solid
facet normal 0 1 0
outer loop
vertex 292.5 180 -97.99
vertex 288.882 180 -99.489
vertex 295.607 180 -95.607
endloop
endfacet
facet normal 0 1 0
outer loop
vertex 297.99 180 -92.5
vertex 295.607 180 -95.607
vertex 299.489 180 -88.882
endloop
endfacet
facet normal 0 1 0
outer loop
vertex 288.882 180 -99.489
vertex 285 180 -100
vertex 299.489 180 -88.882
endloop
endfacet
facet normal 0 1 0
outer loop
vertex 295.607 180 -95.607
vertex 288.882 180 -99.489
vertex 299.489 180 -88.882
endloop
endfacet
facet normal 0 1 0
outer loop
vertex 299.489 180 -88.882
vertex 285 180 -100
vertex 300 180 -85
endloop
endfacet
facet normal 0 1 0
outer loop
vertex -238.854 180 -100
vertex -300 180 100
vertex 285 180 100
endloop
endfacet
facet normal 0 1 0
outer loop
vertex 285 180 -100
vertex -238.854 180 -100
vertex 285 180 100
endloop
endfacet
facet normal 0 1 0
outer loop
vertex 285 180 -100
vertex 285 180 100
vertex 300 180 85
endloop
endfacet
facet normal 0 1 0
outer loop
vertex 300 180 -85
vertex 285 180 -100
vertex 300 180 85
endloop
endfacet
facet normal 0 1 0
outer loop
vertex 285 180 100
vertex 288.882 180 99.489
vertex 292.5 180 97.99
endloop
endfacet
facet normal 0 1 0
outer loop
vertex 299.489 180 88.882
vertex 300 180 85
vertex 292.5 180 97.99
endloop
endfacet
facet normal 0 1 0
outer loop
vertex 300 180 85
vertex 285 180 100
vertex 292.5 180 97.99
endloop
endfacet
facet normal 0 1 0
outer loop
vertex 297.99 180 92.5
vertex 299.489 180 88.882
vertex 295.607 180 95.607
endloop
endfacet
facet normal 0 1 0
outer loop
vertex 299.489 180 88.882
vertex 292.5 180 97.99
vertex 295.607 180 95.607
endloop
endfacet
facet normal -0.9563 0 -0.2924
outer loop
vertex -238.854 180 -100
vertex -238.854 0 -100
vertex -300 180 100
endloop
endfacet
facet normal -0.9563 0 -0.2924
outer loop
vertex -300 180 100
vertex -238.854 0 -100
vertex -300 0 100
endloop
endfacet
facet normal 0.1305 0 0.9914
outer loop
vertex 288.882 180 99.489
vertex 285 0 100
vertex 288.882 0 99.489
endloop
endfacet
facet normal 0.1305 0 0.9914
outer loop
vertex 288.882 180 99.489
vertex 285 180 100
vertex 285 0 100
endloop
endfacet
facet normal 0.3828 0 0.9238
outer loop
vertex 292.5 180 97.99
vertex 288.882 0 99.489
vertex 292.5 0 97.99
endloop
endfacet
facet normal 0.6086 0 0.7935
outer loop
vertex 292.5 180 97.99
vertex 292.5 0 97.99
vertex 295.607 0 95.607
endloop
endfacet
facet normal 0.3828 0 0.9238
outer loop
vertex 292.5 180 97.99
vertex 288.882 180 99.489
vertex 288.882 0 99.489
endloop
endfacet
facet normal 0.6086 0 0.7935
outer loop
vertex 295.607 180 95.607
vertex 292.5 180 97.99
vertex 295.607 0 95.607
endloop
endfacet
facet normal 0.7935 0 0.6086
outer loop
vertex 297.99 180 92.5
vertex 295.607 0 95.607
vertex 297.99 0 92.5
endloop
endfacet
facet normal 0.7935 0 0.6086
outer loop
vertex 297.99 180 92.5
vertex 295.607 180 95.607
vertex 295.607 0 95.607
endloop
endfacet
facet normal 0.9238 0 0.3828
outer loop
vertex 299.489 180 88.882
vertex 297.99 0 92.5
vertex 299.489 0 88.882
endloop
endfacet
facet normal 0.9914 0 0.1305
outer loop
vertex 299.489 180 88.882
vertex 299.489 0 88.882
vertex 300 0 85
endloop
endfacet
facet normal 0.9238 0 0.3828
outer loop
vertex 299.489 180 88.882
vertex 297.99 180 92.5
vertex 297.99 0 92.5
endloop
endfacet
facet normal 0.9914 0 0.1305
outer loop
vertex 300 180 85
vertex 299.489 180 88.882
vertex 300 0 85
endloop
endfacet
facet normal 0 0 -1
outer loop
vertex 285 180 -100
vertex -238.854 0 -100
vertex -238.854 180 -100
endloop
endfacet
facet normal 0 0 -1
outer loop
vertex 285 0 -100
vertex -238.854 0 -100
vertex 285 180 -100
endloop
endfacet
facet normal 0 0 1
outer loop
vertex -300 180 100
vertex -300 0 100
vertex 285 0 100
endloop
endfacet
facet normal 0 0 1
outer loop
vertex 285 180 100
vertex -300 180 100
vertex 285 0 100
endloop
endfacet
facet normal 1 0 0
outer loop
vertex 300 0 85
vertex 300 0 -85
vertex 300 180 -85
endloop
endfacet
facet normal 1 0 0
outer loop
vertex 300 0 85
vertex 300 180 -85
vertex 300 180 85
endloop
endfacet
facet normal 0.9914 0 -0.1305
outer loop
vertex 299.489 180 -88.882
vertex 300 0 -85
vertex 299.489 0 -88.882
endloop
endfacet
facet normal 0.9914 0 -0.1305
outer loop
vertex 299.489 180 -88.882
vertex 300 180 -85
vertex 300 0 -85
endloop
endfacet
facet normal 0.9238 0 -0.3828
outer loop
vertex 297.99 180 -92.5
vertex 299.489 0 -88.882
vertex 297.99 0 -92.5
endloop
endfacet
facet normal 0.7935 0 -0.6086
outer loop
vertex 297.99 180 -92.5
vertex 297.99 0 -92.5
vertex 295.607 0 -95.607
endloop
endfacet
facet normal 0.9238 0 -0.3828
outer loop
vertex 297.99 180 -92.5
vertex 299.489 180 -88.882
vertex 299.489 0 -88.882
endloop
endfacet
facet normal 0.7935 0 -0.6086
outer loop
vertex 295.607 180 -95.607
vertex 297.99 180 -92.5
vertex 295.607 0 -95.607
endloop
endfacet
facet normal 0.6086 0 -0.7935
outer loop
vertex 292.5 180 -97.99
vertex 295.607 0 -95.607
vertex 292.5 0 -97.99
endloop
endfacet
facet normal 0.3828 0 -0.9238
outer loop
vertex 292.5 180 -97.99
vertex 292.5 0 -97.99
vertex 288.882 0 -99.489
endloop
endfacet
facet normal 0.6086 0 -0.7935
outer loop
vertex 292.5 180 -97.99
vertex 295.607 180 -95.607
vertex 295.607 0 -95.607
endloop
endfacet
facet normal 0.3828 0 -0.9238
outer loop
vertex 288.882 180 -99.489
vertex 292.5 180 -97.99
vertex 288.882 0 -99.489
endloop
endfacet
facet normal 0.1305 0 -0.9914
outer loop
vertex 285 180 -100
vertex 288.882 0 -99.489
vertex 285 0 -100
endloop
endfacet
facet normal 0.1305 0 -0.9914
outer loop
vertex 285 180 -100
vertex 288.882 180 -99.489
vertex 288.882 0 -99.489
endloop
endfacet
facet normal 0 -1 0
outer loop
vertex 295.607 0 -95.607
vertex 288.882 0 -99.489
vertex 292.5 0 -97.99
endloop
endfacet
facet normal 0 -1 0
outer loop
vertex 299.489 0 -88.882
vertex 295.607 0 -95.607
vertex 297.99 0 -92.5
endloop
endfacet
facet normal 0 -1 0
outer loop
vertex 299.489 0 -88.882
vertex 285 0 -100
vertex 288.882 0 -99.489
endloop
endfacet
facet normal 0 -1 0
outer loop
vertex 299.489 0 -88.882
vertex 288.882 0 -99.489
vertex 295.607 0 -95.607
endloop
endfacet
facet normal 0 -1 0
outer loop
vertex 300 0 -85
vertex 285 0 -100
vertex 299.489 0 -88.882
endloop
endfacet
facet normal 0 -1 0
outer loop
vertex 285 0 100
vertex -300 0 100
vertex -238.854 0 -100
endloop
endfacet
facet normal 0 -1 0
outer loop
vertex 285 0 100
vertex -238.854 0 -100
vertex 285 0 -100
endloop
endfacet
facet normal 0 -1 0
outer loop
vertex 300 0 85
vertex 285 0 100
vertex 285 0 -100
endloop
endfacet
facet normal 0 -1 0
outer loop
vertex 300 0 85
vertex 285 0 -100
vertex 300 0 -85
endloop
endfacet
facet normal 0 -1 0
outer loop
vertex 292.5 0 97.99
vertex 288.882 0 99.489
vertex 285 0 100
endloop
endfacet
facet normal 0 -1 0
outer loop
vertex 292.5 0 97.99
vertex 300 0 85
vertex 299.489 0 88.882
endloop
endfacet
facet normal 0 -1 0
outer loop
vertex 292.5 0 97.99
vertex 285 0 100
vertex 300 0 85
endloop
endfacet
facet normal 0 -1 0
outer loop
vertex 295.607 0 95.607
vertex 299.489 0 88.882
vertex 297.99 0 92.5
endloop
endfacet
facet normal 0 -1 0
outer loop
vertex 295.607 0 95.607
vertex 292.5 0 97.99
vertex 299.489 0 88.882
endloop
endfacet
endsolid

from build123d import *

# Parameters (mm, degrees)
F0_W     = 600
F0_H     = 200
F1_DEPTH = 180
F3_DEPTH = 180.001
F4_R     = 15


with BuildPart() as f1:
    # F0 (on Front) → F1 (new body)
    with BuildSketch(Plane.XZ):
        Rectangle(F0_W, F0_H)
    extrude(amount=-F1_DEPTH)

    # F2 (on face) → F3 (cut, through all)
    with BuildSketch(Plane.XZ):
        Polygon((-238.853864, -100), (-300, 100), (-300, -100), align=None)
    extrude(amount=-F3_DEPTH, mode=Mode.SUBTRACT)

    # F4
    f4_edges = [f1.edges().sort_by_distance(p)[0] for p in [
        (300, 90, 100),
        (300, 90, -100),
    ]]
    fillet(f4_edges, radius=F4_R)


solid = f1.part
